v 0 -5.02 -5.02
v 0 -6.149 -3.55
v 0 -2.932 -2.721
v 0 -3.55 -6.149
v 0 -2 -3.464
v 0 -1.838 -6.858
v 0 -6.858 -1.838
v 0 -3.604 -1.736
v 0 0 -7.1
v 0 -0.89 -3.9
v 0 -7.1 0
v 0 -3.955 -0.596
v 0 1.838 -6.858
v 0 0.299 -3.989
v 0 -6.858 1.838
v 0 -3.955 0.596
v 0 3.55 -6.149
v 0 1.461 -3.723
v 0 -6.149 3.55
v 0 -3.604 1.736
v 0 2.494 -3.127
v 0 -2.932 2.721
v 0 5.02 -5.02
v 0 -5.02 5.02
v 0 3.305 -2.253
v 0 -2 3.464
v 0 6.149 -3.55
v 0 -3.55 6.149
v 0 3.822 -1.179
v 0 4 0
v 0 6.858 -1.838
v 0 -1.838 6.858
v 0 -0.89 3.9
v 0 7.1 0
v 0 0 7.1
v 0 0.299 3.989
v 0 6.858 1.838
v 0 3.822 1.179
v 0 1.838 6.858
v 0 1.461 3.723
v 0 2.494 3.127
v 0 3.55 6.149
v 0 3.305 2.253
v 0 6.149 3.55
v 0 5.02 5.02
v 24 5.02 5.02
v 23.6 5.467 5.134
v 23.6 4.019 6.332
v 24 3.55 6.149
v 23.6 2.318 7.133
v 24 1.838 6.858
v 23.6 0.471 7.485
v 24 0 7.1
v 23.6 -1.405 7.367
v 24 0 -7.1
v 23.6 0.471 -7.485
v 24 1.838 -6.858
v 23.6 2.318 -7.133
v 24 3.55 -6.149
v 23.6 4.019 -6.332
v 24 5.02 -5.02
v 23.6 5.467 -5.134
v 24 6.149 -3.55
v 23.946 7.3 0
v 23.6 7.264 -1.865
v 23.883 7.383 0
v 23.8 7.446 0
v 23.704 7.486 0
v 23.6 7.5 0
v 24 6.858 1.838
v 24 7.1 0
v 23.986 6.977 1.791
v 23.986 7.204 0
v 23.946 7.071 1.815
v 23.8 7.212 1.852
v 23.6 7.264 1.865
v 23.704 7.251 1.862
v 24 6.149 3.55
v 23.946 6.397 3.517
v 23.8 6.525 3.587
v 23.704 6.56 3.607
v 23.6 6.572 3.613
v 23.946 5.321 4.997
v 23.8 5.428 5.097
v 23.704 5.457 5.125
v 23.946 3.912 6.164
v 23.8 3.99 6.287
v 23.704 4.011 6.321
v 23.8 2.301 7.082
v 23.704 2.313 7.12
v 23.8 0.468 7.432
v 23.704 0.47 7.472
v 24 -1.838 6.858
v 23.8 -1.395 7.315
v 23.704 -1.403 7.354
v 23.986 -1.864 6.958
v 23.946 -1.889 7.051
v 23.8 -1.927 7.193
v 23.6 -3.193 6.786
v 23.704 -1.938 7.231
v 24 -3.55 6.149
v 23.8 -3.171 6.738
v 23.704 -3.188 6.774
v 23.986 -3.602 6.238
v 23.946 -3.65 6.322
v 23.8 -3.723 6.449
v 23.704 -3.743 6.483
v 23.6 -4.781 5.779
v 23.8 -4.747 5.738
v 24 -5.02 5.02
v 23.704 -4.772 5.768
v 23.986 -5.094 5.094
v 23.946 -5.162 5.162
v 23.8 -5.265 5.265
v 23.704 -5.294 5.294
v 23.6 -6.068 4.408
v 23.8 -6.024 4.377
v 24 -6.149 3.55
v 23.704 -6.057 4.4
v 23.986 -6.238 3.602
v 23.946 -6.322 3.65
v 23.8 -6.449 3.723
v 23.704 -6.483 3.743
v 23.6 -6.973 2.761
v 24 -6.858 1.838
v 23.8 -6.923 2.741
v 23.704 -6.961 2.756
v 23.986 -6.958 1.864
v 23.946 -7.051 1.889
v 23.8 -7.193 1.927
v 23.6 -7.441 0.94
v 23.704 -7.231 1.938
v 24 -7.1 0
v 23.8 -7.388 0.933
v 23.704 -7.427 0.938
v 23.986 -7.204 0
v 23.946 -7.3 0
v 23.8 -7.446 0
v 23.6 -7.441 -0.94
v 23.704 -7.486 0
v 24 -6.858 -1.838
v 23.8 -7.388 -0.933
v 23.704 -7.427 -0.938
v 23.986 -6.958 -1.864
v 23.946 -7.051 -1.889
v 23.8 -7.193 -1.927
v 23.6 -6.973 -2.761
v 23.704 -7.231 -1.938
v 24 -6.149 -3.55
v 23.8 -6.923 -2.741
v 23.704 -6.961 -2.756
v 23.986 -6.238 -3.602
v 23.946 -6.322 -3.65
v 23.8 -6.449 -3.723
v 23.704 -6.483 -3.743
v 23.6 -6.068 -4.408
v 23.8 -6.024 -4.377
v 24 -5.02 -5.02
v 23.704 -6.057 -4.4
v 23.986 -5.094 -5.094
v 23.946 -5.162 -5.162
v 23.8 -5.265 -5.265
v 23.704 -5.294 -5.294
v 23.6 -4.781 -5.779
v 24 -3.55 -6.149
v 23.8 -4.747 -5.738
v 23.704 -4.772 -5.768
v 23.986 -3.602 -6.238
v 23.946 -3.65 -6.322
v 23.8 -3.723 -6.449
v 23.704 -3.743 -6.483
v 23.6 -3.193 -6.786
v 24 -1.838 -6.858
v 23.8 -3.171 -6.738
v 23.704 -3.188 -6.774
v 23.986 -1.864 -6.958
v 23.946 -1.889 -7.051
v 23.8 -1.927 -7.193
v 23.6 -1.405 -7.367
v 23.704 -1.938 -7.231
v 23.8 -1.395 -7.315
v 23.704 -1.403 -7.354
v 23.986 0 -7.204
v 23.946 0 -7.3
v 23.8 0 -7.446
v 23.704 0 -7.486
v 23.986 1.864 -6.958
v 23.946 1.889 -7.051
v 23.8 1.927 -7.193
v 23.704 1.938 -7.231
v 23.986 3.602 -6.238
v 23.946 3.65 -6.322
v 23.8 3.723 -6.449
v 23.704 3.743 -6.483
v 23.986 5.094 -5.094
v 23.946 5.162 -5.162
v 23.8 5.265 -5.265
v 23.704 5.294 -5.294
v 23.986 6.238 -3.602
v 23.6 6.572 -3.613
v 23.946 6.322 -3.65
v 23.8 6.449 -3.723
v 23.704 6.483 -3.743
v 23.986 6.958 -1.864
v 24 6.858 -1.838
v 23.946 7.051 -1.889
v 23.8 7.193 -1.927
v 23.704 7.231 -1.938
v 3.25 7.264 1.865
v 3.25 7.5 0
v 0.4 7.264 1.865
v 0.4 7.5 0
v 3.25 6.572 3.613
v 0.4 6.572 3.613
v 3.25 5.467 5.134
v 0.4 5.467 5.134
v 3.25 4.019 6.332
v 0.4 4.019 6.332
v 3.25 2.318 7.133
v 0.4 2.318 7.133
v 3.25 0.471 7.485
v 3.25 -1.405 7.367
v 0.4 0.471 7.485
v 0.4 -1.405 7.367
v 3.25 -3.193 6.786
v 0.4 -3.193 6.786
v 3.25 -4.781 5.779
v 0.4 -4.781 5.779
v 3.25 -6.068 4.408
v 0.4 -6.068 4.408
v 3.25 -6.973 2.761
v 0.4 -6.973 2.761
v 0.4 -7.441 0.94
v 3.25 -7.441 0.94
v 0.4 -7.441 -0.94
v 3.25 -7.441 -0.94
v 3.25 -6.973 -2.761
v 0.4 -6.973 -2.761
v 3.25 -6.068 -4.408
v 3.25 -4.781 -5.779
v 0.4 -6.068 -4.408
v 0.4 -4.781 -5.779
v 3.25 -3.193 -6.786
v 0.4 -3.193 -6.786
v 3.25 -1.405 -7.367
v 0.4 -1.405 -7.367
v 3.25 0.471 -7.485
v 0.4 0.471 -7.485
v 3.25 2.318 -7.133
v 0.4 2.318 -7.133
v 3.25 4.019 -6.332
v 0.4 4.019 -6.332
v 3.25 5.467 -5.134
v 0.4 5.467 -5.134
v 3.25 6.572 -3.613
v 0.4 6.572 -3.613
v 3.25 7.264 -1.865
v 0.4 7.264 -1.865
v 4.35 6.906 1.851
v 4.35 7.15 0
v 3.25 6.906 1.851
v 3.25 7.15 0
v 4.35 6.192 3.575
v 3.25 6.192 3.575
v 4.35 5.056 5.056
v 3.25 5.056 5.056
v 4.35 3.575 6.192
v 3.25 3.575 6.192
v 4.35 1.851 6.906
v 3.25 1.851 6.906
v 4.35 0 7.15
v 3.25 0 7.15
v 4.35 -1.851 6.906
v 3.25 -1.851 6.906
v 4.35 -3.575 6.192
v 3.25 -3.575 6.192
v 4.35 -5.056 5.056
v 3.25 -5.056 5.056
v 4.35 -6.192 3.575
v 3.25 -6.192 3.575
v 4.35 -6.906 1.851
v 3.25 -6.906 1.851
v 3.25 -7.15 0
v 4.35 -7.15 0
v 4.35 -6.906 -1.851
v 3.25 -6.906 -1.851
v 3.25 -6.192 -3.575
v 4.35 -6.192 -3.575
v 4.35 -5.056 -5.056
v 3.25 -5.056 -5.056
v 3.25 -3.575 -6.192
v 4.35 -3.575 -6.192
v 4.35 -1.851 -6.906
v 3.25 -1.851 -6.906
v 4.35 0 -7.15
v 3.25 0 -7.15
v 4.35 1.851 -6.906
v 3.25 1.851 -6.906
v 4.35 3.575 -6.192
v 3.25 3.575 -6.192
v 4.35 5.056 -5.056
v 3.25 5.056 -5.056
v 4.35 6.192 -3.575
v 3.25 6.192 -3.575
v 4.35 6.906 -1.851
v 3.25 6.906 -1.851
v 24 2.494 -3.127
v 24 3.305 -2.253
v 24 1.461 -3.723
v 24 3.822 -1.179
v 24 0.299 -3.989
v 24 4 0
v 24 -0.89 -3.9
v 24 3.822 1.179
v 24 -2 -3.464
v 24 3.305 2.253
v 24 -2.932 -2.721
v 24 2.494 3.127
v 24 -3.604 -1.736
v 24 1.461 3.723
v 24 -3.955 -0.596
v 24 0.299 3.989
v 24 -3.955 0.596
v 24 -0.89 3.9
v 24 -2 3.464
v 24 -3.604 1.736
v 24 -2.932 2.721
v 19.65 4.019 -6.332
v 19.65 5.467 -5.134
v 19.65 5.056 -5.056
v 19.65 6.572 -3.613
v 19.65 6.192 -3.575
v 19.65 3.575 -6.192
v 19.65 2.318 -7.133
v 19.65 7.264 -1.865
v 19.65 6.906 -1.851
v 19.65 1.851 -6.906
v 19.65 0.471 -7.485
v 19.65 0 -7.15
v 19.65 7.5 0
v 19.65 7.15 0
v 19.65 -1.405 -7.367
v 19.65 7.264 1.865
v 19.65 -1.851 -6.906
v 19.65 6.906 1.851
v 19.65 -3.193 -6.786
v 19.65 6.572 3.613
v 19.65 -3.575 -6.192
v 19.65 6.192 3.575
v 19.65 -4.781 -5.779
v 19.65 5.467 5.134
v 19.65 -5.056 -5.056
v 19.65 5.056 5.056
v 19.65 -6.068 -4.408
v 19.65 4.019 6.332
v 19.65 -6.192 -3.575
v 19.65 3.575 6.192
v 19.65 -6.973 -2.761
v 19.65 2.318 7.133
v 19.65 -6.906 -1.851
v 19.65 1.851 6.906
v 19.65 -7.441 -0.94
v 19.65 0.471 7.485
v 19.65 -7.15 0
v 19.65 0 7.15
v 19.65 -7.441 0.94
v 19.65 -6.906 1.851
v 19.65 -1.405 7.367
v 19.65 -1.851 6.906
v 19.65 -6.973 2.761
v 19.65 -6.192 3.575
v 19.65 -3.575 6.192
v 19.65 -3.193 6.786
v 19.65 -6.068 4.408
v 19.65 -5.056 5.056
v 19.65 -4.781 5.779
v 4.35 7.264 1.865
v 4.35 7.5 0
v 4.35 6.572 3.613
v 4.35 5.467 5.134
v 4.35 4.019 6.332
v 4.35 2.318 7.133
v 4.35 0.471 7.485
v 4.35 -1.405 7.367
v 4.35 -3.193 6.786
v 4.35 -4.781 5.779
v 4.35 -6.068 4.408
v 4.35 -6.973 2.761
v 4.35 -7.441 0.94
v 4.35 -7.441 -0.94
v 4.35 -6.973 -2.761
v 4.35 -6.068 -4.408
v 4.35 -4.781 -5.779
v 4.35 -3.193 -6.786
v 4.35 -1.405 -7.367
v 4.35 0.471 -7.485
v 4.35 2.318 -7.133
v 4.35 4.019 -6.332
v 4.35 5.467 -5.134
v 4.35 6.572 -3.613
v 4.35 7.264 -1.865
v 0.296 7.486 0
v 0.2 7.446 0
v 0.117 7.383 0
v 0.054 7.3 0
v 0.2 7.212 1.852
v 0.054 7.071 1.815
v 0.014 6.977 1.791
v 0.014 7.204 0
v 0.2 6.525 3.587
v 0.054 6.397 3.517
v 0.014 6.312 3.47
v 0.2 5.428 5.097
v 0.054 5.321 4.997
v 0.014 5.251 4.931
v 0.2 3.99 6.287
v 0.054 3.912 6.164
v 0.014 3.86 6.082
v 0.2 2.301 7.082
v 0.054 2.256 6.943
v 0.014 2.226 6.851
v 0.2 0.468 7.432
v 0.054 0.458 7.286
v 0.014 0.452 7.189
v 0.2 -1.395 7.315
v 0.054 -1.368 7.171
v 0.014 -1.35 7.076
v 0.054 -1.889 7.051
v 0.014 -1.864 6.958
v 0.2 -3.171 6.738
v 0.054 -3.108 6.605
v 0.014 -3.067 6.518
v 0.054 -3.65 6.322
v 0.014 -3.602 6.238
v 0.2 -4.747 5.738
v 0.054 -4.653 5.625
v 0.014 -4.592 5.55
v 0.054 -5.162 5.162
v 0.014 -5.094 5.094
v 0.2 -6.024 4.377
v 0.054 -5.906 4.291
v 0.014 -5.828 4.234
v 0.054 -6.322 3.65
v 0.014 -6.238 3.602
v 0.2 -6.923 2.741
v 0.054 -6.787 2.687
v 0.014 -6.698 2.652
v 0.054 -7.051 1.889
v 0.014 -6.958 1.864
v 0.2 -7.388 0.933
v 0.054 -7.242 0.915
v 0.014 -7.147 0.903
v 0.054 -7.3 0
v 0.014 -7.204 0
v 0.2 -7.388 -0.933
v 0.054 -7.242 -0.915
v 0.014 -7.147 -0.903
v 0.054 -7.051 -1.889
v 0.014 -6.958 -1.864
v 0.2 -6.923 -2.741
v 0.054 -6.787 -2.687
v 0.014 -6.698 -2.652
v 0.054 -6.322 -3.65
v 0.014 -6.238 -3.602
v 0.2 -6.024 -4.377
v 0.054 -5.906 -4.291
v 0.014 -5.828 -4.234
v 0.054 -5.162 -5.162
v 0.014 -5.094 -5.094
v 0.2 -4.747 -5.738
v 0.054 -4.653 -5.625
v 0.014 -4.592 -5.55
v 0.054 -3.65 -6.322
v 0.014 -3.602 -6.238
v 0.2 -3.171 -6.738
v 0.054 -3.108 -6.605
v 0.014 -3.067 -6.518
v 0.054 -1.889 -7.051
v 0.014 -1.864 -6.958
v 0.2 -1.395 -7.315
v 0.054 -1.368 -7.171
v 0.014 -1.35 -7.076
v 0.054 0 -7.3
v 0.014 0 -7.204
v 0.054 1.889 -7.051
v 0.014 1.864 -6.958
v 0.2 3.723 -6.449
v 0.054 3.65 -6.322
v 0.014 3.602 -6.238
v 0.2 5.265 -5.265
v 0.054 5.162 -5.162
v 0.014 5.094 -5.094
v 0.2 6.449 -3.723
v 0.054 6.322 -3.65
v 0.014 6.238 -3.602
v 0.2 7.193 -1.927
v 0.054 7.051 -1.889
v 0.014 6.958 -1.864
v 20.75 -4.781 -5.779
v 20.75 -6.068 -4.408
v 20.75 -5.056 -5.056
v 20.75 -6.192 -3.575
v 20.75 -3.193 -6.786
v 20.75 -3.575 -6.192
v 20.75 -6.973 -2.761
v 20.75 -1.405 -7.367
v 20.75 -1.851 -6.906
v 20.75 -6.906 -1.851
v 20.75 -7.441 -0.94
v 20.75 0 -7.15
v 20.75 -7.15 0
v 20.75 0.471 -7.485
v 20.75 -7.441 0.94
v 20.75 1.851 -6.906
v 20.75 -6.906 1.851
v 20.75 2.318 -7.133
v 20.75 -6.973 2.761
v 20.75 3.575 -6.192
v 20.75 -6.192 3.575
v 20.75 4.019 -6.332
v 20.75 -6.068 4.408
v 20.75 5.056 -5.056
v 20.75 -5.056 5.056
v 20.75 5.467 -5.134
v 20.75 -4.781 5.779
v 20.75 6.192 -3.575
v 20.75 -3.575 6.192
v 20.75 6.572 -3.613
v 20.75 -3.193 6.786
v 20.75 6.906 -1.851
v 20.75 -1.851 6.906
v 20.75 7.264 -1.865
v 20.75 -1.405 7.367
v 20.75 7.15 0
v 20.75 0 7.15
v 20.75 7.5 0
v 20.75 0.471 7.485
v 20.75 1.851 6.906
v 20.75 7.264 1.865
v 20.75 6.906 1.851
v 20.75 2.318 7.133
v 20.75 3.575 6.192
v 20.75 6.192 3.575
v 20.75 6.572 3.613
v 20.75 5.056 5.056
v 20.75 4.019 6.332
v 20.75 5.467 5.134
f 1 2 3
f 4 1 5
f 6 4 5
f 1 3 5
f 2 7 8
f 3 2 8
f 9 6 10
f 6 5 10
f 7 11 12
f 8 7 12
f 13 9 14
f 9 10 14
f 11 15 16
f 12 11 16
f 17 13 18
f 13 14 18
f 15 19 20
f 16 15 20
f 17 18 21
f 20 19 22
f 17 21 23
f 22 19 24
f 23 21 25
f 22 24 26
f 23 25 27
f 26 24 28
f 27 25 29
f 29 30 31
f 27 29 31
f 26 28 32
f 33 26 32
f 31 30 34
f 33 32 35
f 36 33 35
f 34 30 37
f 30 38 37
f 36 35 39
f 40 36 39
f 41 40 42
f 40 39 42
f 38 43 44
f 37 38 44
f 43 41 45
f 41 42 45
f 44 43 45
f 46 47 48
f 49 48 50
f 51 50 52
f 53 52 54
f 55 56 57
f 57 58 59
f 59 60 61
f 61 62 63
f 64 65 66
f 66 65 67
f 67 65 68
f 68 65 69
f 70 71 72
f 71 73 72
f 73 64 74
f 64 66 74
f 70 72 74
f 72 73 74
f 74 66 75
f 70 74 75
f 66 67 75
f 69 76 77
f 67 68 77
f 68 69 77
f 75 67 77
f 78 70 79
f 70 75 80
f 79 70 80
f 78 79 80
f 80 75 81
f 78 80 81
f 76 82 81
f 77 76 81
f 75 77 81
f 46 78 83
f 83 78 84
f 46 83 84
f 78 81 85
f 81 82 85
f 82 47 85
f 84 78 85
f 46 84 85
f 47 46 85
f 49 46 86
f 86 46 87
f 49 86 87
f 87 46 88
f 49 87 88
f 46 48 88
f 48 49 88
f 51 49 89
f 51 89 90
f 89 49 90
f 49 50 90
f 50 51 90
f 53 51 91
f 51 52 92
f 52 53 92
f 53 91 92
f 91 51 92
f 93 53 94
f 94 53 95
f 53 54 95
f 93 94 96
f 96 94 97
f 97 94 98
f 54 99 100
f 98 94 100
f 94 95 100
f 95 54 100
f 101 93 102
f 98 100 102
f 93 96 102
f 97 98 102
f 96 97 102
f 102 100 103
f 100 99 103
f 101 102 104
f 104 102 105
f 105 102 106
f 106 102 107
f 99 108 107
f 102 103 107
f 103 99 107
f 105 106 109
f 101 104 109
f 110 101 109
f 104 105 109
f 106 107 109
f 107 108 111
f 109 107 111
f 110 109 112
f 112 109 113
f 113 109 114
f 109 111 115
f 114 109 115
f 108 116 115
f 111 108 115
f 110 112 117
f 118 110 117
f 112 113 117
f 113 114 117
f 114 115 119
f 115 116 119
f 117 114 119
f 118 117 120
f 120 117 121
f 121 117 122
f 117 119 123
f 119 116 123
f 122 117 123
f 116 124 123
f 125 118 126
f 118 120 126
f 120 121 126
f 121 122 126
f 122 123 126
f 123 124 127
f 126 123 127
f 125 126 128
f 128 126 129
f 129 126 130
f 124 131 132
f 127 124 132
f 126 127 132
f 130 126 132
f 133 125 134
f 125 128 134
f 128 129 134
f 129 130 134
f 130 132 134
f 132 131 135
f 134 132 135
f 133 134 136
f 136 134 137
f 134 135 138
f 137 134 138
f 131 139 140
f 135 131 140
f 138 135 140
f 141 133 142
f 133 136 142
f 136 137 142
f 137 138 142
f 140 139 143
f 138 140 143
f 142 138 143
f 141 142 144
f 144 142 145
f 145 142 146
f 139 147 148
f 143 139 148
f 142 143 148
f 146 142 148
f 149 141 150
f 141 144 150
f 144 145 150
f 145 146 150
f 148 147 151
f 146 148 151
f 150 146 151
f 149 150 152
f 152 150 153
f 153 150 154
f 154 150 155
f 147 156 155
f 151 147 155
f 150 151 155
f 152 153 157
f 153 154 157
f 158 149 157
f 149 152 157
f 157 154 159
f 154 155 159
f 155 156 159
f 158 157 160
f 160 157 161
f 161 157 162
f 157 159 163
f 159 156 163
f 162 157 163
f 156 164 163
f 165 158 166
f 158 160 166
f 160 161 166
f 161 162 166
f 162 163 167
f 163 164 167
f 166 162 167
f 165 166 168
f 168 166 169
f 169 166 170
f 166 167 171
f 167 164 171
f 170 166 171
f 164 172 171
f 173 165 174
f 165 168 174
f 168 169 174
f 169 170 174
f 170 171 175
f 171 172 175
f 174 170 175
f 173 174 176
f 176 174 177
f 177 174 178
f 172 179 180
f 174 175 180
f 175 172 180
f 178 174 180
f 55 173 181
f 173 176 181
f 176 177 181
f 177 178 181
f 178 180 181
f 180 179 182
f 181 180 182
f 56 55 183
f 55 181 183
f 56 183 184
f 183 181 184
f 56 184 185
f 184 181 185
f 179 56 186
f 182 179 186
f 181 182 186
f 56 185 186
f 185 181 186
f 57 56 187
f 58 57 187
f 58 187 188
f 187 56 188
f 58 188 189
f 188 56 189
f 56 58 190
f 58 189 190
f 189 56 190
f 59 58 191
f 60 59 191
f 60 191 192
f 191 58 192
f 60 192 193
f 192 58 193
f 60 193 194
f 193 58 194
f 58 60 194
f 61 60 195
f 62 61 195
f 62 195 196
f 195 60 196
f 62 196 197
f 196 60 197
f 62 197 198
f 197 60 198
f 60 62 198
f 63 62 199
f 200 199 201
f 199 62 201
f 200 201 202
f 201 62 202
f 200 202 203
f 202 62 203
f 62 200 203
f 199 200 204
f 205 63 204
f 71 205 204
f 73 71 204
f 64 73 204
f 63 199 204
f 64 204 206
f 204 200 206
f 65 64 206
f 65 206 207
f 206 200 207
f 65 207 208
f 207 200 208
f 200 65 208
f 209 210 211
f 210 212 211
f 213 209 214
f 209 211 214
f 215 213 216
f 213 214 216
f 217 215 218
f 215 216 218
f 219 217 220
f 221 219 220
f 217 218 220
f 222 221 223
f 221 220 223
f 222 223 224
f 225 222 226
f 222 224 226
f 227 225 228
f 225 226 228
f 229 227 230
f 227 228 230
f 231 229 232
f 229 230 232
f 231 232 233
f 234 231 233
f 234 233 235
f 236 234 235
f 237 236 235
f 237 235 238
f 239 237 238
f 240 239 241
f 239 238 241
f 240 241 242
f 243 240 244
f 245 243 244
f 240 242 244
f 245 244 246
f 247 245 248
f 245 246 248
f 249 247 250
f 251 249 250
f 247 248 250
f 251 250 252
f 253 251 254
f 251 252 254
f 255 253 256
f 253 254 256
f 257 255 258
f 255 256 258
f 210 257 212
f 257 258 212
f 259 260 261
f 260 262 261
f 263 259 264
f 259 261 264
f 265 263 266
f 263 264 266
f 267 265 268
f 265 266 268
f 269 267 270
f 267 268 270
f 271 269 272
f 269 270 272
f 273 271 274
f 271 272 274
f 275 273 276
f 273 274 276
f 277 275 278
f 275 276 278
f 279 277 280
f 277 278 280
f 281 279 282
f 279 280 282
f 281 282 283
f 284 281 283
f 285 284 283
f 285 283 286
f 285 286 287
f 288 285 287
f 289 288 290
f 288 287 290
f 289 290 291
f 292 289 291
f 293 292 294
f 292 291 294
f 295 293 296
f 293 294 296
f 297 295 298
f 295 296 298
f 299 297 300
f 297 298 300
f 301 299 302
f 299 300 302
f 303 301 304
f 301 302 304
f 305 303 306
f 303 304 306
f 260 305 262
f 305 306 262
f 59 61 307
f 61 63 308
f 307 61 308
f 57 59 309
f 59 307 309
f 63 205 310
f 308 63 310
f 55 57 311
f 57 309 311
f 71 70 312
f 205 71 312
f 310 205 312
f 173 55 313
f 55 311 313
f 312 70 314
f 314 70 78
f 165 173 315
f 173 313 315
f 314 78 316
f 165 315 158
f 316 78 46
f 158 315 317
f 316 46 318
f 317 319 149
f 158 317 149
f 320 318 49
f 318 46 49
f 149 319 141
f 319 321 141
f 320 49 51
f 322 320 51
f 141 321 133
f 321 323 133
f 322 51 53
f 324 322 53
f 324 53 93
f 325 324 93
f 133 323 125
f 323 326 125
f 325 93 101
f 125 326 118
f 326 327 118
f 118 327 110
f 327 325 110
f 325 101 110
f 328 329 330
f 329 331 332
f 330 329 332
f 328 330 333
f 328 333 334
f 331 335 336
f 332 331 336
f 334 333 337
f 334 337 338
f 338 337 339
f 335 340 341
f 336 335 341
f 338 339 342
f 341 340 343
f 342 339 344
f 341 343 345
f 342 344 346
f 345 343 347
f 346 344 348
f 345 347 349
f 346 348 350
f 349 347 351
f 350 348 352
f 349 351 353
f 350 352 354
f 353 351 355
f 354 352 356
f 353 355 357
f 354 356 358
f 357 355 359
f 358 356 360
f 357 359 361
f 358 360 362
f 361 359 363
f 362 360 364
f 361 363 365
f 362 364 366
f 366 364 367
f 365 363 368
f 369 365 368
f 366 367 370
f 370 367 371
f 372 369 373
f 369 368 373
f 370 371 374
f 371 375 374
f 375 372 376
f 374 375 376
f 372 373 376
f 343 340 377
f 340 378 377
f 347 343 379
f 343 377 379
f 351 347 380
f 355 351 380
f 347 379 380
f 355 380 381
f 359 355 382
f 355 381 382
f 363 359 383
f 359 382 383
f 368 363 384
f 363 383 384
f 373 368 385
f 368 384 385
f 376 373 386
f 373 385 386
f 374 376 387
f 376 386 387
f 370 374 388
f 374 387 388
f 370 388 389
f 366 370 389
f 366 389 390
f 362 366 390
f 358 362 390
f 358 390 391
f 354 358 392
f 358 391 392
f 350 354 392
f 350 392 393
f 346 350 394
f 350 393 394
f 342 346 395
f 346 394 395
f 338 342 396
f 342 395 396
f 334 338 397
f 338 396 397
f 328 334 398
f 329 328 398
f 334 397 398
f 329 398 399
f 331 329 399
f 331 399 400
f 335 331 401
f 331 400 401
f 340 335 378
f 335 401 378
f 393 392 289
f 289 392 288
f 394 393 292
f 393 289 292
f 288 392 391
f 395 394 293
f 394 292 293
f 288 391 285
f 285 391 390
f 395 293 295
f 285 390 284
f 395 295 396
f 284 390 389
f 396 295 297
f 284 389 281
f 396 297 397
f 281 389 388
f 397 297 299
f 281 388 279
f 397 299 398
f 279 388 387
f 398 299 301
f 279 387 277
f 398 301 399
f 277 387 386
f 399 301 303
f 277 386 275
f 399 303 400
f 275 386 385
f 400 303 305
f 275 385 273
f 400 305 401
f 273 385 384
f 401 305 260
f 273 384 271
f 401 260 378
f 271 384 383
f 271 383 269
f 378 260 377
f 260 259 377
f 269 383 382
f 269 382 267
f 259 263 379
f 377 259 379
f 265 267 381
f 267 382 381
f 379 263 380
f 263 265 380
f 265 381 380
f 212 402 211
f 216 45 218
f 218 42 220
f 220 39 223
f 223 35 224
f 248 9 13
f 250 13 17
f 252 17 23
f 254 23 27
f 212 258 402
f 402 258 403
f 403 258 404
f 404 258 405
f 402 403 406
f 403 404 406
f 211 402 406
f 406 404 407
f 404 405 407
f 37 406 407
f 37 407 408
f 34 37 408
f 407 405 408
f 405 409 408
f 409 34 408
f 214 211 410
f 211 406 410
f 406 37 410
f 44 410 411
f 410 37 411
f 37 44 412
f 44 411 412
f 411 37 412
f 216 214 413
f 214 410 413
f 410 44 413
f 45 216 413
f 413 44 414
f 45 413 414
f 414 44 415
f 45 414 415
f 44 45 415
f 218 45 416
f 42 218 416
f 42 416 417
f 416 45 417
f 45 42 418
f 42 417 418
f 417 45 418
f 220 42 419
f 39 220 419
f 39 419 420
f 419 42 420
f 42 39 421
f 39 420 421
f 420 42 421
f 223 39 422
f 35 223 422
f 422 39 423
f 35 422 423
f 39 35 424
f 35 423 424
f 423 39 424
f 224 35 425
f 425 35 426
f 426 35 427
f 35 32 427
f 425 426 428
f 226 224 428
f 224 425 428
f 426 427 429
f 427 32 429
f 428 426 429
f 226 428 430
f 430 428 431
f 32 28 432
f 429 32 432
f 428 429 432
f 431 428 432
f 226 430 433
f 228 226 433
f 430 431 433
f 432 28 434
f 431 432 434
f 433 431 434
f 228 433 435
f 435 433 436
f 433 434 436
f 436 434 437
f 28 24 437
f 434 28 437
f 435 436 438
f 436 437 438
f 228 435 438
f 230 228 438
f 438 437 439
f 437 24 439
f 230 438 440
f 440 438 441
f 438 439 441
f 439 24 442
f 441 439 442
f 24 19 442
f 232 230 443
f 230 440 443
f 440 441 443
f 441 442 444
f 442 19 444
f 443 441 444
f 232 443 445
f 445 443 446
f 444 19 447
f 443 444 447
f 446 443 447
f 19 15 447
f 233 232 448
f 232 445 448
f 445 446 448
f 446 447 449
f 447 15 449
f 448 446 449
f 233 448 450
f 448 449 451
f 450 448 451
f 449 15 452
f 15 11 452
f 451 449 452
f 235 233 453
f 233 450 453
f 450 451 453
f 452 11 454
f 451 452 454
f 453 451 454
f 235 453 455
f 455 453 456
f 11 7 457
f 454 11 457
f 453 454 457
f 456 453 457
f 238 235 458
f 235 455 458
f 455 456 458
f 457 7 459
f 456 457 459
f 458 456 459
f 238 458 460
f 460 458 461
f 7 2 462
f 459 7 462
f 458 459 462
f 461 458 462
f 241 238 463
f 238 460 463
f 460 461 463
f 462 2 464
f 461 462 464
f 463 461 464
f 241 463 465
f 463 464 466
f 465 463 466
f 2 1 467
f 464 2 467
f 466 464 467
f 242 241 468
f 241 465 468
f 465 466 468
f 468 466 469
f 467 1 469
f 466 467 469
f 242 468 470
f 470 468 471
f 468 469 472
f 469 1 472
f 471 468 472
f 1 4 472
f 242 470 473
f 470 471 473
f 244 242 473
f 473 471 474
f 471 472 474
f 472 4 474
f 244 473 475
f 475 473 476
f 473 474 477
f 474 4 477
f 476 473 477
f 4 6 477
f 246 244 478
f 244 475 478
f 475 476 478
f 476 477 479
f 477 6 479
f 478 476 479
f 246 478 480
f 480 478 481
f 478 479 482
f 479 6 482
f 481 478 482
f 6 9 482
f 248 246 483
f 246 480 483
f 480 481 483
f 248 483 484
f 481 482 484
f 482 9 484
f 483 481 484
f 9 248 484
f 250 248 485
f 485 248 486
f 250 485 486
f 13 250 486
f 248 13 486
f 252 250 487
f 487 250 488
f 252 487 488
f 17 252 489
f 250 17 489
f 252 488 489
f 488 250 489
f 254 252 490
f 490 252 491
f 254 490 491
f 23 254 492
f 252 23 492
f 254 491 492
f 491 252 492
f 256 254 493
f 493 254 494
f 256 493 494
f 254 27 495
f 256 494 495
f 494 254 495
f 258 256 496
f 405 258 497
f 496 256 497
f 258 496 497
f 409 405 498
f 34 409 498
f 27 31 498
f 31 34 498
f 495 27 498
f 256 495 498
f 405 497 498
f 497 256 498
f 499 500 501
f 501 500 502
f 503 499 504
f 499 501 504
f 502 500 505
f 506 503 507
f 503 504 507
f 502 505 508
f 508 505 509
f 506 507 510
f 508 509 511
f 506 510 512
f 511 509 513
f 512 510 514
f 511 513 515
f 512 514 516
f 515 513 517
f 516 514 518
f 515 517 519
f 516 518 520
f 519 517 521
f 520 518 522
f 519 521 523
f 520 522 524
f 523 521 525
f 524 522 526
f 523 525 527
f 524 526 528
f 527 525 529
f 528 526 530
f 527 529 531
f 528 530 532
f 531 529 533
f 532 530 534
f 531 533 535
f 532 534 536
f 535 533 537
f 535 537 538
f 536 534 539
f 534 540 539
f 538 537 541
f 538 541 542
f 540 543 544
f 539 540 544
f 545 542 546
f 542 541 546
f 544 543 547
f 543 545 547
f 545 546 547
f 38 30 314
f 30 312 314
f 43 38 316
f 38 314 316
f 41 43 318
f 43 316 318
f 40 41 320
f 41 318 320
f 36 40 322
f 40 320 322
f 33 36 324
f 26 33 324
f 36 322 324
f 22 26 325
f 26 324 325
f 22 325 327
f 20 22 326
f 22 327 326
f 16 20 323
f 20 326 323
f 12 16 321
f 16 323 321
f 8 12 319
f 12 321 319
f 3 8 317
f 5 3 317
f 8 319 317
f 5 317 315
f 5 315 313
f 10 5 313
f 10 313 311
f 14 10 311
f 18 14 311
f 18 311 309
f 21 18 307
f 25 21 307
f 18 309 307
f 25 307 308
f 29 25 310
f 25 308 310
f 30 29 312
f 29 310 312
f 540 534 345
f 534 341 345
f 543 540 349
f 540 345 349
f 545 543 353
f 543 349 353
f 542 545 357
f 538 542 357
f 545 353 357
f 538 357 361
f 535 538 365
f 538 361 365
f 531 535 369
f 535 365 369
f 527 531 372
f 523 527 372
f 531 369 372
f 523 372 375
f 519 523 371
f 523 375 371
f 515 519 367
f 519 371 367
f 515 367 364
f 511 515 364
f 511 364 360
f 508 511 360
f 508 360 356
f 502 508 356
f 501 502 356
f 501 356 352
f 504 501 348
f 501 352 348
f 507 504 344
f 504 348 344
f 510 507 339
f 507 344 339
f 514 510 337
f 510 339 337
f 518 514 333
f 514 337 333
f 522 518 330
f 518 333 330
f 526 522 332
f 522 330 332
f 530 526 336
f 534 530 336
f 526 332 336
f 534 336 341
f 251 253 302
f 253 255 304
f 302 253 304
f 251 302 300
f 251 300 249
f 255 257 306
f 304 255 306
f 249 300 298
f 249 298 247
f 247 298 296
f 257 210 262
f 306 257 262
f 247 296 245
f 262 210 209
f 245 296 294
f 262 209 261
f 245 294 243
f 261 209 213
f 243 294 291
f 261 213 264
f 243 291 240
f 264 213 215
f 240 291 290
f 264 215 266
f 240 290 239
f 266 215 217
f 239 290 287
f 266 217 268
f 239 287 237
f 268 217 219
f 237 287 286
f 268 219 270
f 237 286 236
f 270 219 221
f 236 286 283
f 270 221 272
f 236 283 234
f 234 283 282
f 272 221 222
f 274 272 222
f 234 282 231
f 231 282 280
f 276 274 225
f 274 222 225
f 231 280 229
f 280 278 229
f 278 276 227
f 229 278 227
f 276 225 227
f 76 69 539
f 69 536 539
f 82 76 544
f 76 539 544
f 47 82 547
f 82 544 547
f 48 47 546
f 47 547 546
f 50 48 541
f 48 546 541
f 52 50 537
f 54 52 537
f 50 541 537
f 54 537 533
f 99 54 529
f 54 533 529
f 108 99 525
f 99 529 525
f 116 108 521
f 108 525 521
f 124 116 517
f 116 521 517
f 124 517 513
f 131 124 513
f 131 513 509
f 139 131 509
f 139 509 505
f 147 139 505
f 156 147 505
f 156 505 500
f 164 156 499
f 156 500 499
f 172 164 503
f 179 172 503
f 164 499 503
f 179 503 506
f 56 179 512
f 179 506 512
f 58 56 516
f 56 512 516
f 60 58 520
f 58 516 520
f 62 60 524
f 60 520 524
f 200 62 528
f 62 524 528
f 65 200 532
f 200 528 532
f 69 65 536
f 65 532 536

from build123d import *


with BuildPart() as part:
    # Sketch1 → Revolve1 (revolve)
    with BuildSketch(Plane.XY):
        with BuildLine():
            Line((0, 7.1), (0, 4))
            Line((0, 4), (24, 4))
            Line((24, 4), (24, 7.1))
            ThreePointArc((24, 7.1), (23.882842712, 7.382842712), (23.6, 7.5))
            Line((23.6, 7.5), (20.75, 7.5))
            Line((20.75, 7.5), (20.75, 7.15))
            Line((20.75, 7.15), (19.65, 7.15))
            Line((19.65, 7.15), (19.65, 7.5))
            Line((19.65, 7.5), (4.35, 7.5))
            Line((4.35, 7.5), (4.35, 7.15))
            Line((4.35, 7.15), (3.25, 7.15))
            Line((3.25, 7.15), (3.25, 7.5))
            Line((3.25, 7.5), (0.4, 7.5))
            ThreePointArc((0.4, 7.5), (0.117157288, 7.382842712), (0, 7.1))
        make_face()
    revolve(axis=Axis((-0.001253994, 0, 0), (1, 0, 0)))


solid = part.part
